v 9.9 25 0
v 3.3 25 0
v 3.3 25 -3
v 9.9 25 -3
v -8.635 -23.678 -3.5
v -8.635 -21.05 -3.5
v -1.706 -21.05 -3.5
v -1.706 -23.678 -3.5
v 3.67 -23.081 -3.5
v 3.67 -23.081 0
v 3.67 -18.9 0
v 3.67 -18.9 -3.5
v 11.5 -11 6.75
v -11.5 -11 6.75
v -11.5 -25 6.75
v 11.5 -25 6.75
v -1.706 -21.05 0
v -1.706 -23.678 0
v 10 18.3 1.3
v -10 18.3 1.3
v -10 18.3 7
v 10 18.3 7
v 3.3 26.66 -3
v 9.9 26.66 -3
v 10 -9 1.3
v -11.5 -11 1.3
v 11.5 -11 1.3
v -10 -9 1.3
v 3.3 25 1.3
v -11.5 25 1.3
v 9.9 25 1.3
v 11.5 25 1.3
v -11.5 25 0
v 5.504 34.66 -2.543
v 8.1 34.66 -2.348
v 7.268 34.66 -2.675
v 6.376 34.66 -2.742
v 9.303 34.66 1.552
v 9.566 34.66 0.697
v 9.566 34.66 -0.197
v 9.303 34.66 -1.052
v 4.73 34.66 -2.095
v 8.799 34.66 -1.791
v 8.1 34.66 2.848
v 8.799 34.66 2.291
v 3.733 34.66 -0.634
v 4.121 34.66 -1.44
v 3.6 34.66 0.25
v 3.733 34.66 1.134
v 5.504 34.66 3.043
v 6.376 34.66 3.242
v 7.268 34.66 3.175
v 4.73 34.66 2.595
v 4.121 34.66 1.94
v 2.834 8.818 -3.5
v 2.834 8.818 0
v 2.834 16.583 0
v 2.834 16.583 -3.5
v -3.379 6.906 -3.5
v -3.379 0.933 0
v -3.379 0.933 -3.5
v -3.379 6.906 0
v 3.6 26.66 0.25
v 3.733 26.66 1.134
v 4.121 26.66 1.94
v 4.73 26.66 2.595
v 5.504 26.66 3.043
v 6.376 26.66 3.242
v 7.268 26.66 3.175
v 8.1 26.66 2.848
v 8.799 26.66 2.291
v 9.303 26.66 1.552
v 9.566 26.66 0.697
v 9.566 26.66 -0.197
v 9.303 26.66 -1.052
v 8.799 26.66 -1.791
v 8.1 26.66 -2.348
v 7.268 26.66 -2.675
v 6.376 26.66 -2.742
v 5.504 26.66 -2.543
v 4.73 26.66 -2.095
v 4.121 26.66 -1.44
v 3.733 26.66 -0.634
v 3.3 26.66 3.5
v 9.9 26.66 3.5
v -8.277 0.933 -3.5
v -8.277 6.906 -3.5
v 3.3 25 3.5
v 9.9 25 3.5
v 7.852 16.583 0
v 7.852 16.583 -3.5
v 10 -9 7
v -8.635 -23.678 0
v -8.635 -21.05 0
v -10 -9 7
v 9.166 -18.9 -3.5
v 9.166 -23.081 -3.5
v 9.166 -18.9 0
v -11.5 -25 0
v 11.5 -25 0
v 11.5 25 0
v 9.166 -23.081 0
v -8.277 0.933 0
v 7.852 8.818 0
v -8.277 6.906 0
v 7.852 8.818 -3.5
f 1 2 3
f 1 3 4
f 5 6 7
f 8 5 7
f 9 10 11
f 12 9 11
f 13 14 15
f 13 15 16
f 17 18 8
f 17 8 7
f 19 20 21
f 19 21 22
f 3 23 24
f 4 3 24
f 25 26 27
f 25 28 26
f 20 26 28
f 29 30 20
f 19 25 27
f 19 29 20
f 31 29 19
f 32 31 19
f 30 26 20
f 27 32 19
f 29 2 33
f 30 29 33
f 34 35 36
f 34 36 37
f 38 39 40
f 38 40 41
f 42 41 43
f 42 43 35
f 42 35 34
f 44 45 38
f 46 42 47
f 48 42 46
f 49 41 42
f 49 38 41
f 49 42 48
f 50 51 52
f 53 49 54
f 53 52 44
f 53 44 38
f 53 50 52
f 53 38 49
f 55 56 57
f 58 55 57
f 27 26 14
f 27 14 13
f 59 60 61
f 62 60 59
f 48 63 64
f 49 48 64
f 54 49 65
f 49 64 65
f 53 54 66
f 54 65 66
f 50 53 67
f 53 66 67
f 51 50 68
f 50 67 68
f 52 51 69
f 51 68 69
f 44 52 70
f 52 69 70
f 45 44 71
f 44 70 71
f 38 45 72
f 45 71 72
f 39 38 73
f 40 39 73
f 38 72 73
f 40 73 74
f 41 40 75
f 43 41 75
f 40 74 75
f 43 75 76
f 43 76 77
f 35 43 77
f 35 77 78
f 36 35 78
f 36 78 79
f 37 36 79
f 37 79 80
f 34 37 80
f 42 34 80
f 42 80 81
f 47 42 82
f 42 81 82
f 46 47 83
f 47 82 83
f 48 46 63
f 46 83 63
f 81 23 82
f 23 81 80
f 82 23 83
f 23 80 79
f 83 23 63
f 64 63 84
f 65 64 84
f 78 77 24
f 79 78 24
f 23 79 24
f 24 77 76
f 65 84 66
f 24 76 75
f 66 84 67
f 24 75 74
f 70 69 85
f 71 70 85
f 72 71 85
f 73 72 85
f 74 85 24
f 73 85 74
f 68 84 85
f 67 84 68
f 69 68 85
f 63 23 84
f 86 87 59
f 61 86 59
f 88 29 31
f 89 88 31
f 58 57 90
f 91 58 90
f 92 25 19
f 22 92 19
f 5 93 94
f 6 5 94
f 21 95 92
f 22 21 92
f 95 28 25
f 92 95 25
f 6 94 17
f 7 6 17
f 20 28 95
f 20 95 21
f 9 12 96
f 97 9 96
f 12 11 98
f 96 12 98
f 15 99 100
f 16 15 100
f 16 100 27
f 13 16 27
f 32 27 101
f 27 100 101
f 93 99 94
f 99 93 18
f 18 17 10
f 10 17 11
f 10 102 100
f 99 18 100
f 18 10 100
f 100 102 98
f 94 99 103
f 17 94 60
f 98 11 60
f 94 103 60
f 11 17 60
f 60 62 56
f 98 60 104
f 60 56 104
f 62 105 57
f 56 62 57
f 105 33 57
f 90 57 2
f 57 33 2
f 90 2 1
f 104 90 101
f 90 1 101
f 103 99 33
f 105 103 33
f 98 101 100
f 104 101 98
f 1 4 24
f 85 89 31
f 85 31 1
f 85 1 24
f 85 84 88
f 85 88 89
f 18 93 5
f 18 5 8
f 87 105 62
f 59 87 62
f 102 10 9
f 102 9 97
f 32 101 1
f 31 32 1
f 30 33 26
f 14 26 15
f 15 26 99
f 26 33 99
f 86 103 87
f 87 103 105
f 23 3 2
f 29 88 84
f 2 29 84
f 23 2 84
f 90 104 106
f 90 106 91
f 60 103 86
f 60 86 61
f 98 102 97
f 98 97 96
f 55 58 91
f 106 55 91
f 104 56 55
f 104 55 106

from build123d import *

# Parameters (mm, degrees)
F0_W          = 20
F0_H          = 27.3
F0_W_2        = 23
F0_H_2        = 14
F0_W_3        = 6.929286
F0_H_3        = 2.628351
F0_W_4        = 5.49564
F0_H_4        = 4.181466
F1_DEPTH      = 1.3
F0_W_5        = 4.898288
F0_H_5        = 5.973523
F0_W_6        = 5.017759
F0_H_6        = 7.765578
F2_DEPTH      = 7
F3_DEPTH      = 6.75
F0_W_7        = 6.6
F0_H_7        = 1.66
F4_DEPTH      = 3.5
F4_DEPTH_BACK = 3
F5_DEPTH      = 3.5
F6_R          = 3
F7_DEPTH      = 8


with BuildPart() as f1:
    # F0 (on Top) → F1 (new body)
    with BuildSketch(Plane.XY):
        Polygon((3.3, 25), (-11.5, 25), (-11.5, -11), (11.5, -11), (11.5, 25), (9.9, 25), align=None)
        with Locations((0, 4.65)):
            Rectangle(F0_W, F0_H, mode=Mode.SUBTRACT)
        with Locations((0, -18)):
            Rectangle(F0_W_2, F0_H_2)
        with Locations((-5.170625, -22.364168)):
            Rectangle(F0_W_3, F0_H_3, mode=Mode.SUBTRACT)
        with Locations((6.418009, -20.990259)):
            Rectangle(F0_W_4, F0_H_4, mode=Mode.SUBTRACT)
    extrude(amount=F1_DEPTH)

    # F0 (on Top) → F2 (join)
    with BuildSketch(Plane.XY):
        with Locations((0, 4.65)):
            Rectangle(F0_W, F0_H)
        with Locations((-5.827712, 3.919329)):
            Rectangle(F0_W_5, F0_H_5, mode=Mode.SUBTRACT)
        with Locations((5.342776, 12.700408)):
            Rectangle(F0_W_6, F0_H_6, mode=Mode.SUBTRACT)
        with Locations((-5.827712, 3.919329)):
            Rectangle(F0_W_5, F0_H_5)
        with Locations((5.342776, 12.700408)):
            Rectangle(F0_W_6, F0_H_6)
    extrude(amount=F2_DEPTH)

    # F0 (on Top) → F3 (join)
    with BuildSketch(Plane.XY):
        with Locations((0, -18)):
            Rectangle(F0_W_2, F0_H_2)
        with Locations((-5.170625, -22.364168)):
            Rectangle(F0_W_3, F0_H_3, mode=Mode.SUBTRACT)
        with Locations((6.418009, -20.990259)):
            Rectangle(F0_W_4, F0_H_4, mode=Mode.SUBTRACT)
        with Locations((6.418009, -20.990259)):
            Rectangle(F0_W_4, F0_H_4)
        with Locations((-5.170625, -22.364168)):
            Rectangle(F0_W_3, F0_H_3)
    extrude(amount=F3_DEPTH)

    # F0 (on Top) → F4 (join, two sides)
    with BuildSketch(Plane.XY) as f4_sk:
        with Locations((6.6, 25.83)):
            Rectangle(F0_W_7, F0_H_7)
    extrude(amount=F4_DEPTH)
    extrude(f4_sk.sketch, amount=-F4_DEPTH_BACK)

    # F0 (on Top) → F5 (join)
    with BuildSketch(Plane.XY):
        with Locations((5.342776, 12.700408)):
            Rectangle(F0_W_6, F0_H_6)
        with Locations((-5.827712, 3.919329)):
            Rectangle(F0_W_5, F0_H_5)
        with Locations((6.418009, -20.990259)):
            Rectangle(F0_W_4, F0_H_4)
        with Locations((-5.170625, -22.364168)):
            Rectangle(F0_W_3, F0_H_3)
    extrude(amount=-F5_DEPTH)

    # F6 (on face) → F7 (join)
    with BuildSketch(Plane(origin=(0, 26.66, 0), x_dir=(-1, 0, 0), z_dir=(0, 1, 0))):
        with Locations((-6.6, 0.25)):
            Circle(F6_R)
    extrude(amount=F7_DEPTH)


solid = f1.part
